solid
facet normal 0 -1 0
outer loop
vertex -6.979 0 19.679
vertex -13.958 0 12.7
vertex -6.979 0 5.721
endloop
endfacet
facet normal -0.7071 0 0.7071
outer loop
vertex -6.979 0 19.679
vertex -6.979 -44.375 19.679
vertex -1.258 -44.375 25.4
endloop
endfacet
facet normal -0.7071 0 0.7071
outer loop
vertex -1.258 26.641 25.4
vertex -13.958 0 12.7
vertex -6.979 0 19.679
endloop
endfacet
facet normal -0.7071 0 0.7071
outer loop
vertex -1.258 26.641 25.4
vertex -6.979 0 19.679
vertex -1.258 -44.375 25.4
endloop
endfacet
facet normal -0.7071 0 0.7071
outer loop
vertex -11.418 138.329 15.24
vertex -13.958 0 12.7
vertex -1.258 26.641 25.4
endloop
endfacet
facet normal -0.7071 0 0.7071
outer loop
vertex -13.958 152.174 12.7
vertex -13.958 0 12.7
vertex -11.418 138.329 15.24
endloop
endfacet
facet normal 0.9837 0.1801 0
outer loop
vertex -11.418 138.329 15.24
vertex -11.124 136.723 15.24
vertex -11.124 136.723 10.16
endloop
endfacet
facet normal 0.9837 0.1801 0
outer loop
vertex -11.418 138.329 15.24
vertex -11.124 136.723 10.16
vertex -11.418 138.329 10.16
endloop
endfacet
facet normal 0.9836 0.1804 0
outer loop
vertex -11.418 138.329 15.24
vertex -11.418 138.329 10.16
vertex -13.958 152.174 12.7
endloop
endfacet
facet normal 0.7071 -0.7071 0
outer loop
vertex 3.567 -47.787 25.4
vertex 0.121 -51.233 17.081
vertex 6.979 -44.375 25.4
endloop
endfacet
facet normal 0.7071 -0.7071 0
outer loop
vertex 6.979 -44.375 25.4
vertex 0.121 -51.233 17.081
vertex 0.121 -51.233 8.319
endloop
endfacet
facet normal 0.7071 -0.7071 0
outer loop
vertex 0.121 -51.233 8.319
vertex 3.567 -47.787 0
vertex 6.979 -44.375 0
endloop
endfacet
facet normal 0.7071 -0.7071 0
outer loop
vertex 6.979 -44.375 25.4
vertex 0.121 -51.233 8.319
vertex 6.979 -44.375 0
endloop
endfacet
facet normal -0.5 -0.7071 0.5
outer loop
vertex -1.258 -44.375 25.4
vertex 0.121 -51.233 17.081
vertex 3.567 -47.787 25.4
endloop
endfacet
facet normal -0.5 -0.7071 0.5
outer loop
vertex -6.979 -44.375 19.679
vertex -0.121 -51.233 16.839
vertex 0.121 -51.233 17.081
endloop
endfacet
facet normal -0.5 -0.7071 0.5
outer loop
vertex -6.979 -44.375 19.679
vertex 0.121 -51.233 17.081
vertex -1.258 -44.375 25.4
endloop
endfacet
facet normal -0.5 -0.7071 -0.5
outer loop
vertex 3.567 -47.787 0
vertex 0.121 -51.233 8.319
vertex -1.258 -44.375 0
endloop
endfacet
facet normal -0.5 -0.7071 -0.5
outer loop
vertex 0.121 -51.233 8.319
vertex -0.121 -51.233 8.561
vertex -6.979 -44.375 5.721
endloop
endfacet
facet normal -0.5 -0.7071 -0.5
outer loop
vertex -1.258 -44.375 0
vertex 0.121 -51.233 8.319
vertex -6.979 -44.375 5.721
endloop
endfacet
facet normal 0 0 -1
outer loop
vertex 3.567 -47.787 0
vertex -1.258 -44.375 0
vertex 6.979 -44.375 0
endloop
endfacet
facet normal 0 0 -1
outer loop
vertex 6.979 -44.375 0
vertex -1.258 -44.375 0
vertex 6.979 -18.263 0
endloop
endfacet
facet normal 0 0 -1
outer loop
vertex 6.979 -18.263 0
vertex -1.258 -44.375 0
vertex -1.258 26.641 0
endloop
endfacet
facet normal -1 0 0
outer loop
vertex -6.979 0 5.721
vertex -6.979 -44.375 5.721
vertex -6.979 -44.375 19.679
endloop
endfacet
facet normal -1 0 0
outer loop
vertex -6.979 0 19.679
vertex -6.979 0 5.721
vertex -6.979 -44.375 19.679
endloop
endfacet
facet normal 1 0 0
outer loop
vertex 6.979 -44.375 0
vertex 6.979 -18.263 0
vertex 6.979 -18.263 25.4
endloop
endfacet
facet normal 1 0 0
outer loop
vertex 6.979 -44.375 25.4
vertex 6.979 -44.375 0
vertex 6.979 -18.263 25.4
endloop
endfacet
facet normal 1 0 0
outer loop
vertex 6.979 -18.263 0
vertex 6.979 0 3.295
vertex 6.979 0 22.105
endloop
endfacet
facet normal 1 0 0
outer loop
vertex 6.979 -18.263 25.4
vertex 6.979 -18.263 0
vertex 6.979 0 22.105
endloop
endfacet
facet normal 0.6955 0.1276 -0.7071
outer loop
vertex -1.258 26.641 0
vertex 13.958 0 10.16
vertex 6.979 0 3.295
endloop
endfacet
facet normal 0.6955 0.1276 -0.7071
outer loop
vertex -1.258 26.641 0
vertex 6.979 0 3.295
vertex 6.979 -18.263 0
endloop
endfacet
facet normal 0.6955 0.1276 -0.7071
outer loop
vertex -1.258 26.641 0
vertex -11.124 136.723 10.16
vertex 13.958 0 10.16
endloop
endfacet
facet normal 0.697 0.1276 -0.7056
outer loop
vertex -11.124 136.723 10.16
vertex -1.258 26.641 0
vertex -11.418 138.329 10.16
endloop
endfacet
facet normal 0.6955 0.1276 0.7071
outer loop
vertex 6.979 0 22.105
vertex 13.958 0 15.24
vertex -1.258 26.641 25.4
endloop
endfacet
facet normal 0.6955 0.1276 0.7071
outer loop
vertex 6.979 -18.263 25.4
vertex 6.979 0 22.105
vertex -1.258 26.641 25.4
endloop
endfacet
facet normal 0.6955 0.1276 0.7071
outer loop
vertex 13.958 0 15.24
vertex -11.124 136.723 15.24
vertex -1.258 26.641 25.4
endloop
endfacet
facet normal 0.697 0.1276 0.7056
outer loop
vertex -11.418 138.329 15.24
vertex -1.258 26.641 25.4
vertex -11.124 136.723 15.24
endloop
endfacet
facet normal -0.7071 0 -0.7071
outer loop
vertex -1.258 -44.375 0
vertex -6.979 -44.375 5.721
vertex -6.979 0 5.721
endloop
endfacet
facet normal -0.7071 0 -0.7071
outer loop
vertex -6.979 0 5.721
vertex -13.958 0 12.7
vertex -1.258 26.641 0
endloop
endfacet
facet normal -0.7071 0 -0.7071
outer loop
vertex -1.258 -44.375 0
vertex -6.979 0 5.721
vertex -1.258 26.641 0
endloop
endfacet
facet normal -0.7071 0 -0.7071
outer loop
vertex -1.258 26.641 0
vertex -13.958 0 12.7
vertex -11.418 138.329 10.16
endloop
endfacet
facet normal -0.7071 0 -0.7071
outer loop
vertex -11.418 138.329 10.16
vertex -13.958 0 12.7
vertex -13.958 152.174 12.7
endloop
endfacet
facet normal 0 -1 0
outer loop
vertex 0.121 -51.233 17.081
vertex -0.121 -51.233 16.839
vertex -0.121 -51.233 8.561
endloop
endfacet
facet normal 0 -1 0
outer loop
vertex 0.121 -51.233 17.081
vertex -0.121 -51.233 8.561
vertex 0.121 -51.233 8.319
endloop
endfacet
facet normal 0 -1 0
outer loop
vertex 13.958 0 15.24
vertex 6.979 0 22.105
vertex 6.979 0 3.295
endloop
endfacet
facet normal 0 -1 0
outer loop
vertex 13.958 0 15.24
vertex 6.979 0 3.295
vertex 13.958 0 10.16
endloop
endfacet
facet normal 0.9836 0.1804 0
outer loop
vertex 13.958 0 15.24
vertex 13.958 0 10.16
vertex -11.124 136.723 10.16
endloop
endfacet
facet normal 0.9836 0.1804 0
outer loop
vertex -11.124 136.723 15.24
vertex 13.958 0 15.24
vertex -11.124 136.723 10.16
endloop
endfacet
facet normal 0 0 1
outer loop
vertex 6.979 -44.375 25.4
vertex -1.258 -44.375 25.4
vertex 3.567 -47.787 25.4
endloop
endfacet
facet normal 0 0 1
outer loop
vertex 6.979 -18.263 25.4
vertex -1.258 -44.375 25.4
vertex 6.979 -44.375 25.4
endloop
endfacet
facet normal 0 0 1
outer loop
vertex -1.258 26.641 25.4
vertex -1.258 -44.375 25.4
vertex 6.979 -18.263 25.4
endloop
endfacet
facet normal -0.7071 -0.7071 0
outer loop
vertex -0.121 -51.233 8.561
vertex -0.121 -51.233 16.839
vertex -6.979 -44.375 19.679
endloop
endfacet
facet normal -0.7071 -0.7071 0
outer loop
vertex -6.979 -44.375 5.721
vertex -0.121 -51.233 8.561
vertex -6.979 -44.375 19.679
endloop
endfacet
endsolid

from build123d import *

# Parameters (mm, degrees)
F1_DEPTH     = 25.4
F2_SIZE      = 12.69999
F3_T1_DEPTH  = 188.8441409877
F4_DEPTH     = 20.574
F5_T1_DEPTH  = 49.2316398108
F5_T3_DEPTH  = 43.3636113916
F5_T5_DEPTH  = 43.3636113916
F5_T7_DEPTH  = 60.6732038629
F5_T12_DEPTH = 43.5108377847
F5_T17_DEPTH = 43.5108377847
F5_T22_DEPTH = 43.5108377847
F5_T27_DEPTH = 43.5108377847


# Not quite as in the source:
# - a fillet or chamfer that OpenCascade refuses, or shapes differently, is made with other operations: its cross-section is extruded or revolved along the edge and cut away or added
# - a fillet or chamfer is up to 0.001 mm smaller than in the source, because OpenCascade refuses the exact size


with BuildPart() as f1:
    # F0 (on Top) → F1 (new body)
    with BuildSketch(Plane.XY):
        Polygon((-6.9792079739, 0), (0, 0), (6.9792079739, 0), (13.9584159479, 0), (0, 76.0870501399), (-11.1239045018, 136.72323427), (-13.9584159479, 152.1741002798), (-13.9584159479, 76.0870501399), (-13.9584159479, 0), align=None)
        Polygon((6.9792079739, 0), (0, 0), (-6.9792079739, 0), (-6.9792079739, -30.6587181985), (-4.935038276, -30.6587181985), (6.9792079739, -30.6587181985), align=None)
    extrude(amount=F1_DEPTH)

    # F2 (size 12.7 in the source; OpenCascade refuses exactly that, so slightly less here)
    f2_edges = [f1.edges().sort_by_distance(p)[0] for p in [
        (-13.958416, 76.08705, 25.4),
        (-13.958416, 76.08705, 0),
    ]]
    chamfer(f2_edges, length=F2_SIZE)

    # F3: chamfer of 10.16 on 2 edges, made by hand

    # F3_s2 → F3_t1 (cut)
    with BuildSketch(Plane(origin=(5.1691181491, -28.1767611209, 0), x_dir=(0, 0, 1), z_dir=(-0.1804419719, 0.9835856316, 0))):
        Polygon((15.24, 13.7292973667), (25.4, 3.5692973667), (25.4, 13.7292973667), align=None)
        Polygon((10.16, 13.7292973667), (0, 3.5692973667), (0, 13.7292973667), align=None)
    extrude(amount=F3_T1_DEPTH, mode=Mode.SUBTRACT)

    # F4 (add): a face of the model
    f4_faces = [f1.faces().sort_by_distance(p)[0] for p in [
        (0.5158291465, -30.6587181985, 12.7),
    ]]
    extrude(f4_faces, amount=F4_DEPTH)

    # F5: chamfer of 6.858 on 6 edges, made by hand

    # F5_s2 → F5_t1 (cut)
    with BuildSketch(Plane.XY.offset(-11.9158199054)):
        Polygon((-0.1212079739, -51.2327181985), (-6.9792079739, -44.3747181985), (-6.9792079739, -51.2327181985), align=None)
    extrude(amount=F5_T1_DEPTH, mode=Mode.SUBTRACT)

    # F5_s4 → F5_t3 (cut)
    with BuildSketch(Plane(origin=(-18.8209558228, 0, 18.8209558228), x_dir=(0, 1, 0), z_dir=(0.7071067812, 0, -0.7071067812))):
        Polygon((-51.2327181985, 5.9681584787), (-44.3747181985, -0.8898415213), (-51.2327181985, -0.8898415213), align=None)
    extrude(amount=F5_T3_DEPTH, mode=Mode.SUBTRACT)

    # F5_s6 → F5_t5 (cut)
    with BuildSketch(Plane(origin=(-6.1209558228, 0, -6.1209558228), x_dir=(0, 1, 0), z_dir=(0.7071067812, 0, 0.7071067812))):
        Polygon((-51.2327181985, 11.9923537635), (-44.3747181985, 18.8503537635), (-51.2327181985, 18.8503537635), align=None)
    extrude(amount=F5_T5_DEPTH, mode=Mode.SUBTRACT)

    # F5_s8 → F5_t7 (cut)
    with BuildSketch(Plane.XY.offset(-17.6366019315)):
        Polygon((0.1212079739, -51.2327181985), (6.9792079739, -44.3747181985), (6.9792079739, -51.2327181985), align=None)
    extrude(amount=F5_T7_DEPTH, mode=Mode.SUBTRACT)


with BuildPart() as f5_tool10:
    # F5_s11 → F5_t12 (new body)
    with BuildSketch(Plane.YZ.offset(-18.8950278793)):
        Polygon((-51.2327181985, 6.858), (-44.3747181985, 0), (-51.2327181985, 0), align=None)
    extrude(amount=F5_T12_DEPTH)

    split(bisect_by=Plane(origin=(-16.0034385627, -22.6322798599, -16.0034385627), x_dir=(0.8164965809, -0.5773502692, 0), z_dir=(-0.5, -0.7071067812, -0.5)), keep=Keep.TOP)


with BuildPart() as f1_1:
    add(f1.part)

    # F5_t9: cut F5_tool10
    add(f5_tool10.part, mode=Mode.SUBTRACT)


with BuildPart() as f5_tool15:
    # F5_s16 → F5_t17 (new body)
    with BuildSketch(Plane.YZ.offset(-18.8950278793)):
        Polygon((-51.2327181985, 6.858), (-44.3747181985, 0), (-51.2327181985, 0), align=None)
    extrude(amount=F5_T17_DEPTH)

    split(bisect_by=Plane(origin=(25.6769630862, -25.6769630862, 0), x_dir=(0, 0, 1), z_dir=(0.7071067812, -0.7071067812, 0)), keep=Keep.TOP)


with BuildPart() as f1_2:
    add(f1_1.part)

    # F5_t14: cut F5_tool15
    add(f5_tool15.part, mode=Mode.SUBTRACT)


with BuildPart() as f5_tool20:
    # F5_s21 → F5_t22 (new body)
    with BuildSketch(Plane.YZ.offset(-18.8950278793)):
        Polygon((-44.3747181985, 25.4), (-51.2327181985, 18.542), (-51.2327181985, 25.4), align=None)
    extrude(amount=F5_T22_DEPTH)

    split(bisect_by=Plane(origin=(-22.3534385627, -31.612535981, 22.3534385627), x_dir=(0.8164965809, -0.5773502692, 0), z_dir=(-0.5, -0.7071067812, 0.5)), keep=Keep.TOP)


with BuildPart() as f1_3:
    add(f1_2.part)

    # F5_t19: cut F5_tool20
    add(f5_tool20.part, mode=Mode.SUBTRACT)


with BuildPart() as f5_tool25:
    # F5_s26 → F5_t27 (new body)
    with BuildSketch(Plane.YZ.offset(-18.8950278793)):
        Polygon((-44.3747181985, 25.4), (-51.2327181985, 18.542), (-51.2327181985, 25.4), align=None)
    extrude(amount=F5_T27_DEPTH)

    split(bisect_by=Plane(origin=(25.6769630862, -25.6769630862, 0), x_dir=(0, 0, 1), z_dir=(0.7071067812, -0.7071067812, 0)), keep=Keep.TOP)


with BuildPart() as f1_4:
    add(f1_3.part)

    # F5_t24: cut F5_tool25
    add(f5_tool25.part, mode=Mode.SUBTRACT)


solid = f1_4.part
